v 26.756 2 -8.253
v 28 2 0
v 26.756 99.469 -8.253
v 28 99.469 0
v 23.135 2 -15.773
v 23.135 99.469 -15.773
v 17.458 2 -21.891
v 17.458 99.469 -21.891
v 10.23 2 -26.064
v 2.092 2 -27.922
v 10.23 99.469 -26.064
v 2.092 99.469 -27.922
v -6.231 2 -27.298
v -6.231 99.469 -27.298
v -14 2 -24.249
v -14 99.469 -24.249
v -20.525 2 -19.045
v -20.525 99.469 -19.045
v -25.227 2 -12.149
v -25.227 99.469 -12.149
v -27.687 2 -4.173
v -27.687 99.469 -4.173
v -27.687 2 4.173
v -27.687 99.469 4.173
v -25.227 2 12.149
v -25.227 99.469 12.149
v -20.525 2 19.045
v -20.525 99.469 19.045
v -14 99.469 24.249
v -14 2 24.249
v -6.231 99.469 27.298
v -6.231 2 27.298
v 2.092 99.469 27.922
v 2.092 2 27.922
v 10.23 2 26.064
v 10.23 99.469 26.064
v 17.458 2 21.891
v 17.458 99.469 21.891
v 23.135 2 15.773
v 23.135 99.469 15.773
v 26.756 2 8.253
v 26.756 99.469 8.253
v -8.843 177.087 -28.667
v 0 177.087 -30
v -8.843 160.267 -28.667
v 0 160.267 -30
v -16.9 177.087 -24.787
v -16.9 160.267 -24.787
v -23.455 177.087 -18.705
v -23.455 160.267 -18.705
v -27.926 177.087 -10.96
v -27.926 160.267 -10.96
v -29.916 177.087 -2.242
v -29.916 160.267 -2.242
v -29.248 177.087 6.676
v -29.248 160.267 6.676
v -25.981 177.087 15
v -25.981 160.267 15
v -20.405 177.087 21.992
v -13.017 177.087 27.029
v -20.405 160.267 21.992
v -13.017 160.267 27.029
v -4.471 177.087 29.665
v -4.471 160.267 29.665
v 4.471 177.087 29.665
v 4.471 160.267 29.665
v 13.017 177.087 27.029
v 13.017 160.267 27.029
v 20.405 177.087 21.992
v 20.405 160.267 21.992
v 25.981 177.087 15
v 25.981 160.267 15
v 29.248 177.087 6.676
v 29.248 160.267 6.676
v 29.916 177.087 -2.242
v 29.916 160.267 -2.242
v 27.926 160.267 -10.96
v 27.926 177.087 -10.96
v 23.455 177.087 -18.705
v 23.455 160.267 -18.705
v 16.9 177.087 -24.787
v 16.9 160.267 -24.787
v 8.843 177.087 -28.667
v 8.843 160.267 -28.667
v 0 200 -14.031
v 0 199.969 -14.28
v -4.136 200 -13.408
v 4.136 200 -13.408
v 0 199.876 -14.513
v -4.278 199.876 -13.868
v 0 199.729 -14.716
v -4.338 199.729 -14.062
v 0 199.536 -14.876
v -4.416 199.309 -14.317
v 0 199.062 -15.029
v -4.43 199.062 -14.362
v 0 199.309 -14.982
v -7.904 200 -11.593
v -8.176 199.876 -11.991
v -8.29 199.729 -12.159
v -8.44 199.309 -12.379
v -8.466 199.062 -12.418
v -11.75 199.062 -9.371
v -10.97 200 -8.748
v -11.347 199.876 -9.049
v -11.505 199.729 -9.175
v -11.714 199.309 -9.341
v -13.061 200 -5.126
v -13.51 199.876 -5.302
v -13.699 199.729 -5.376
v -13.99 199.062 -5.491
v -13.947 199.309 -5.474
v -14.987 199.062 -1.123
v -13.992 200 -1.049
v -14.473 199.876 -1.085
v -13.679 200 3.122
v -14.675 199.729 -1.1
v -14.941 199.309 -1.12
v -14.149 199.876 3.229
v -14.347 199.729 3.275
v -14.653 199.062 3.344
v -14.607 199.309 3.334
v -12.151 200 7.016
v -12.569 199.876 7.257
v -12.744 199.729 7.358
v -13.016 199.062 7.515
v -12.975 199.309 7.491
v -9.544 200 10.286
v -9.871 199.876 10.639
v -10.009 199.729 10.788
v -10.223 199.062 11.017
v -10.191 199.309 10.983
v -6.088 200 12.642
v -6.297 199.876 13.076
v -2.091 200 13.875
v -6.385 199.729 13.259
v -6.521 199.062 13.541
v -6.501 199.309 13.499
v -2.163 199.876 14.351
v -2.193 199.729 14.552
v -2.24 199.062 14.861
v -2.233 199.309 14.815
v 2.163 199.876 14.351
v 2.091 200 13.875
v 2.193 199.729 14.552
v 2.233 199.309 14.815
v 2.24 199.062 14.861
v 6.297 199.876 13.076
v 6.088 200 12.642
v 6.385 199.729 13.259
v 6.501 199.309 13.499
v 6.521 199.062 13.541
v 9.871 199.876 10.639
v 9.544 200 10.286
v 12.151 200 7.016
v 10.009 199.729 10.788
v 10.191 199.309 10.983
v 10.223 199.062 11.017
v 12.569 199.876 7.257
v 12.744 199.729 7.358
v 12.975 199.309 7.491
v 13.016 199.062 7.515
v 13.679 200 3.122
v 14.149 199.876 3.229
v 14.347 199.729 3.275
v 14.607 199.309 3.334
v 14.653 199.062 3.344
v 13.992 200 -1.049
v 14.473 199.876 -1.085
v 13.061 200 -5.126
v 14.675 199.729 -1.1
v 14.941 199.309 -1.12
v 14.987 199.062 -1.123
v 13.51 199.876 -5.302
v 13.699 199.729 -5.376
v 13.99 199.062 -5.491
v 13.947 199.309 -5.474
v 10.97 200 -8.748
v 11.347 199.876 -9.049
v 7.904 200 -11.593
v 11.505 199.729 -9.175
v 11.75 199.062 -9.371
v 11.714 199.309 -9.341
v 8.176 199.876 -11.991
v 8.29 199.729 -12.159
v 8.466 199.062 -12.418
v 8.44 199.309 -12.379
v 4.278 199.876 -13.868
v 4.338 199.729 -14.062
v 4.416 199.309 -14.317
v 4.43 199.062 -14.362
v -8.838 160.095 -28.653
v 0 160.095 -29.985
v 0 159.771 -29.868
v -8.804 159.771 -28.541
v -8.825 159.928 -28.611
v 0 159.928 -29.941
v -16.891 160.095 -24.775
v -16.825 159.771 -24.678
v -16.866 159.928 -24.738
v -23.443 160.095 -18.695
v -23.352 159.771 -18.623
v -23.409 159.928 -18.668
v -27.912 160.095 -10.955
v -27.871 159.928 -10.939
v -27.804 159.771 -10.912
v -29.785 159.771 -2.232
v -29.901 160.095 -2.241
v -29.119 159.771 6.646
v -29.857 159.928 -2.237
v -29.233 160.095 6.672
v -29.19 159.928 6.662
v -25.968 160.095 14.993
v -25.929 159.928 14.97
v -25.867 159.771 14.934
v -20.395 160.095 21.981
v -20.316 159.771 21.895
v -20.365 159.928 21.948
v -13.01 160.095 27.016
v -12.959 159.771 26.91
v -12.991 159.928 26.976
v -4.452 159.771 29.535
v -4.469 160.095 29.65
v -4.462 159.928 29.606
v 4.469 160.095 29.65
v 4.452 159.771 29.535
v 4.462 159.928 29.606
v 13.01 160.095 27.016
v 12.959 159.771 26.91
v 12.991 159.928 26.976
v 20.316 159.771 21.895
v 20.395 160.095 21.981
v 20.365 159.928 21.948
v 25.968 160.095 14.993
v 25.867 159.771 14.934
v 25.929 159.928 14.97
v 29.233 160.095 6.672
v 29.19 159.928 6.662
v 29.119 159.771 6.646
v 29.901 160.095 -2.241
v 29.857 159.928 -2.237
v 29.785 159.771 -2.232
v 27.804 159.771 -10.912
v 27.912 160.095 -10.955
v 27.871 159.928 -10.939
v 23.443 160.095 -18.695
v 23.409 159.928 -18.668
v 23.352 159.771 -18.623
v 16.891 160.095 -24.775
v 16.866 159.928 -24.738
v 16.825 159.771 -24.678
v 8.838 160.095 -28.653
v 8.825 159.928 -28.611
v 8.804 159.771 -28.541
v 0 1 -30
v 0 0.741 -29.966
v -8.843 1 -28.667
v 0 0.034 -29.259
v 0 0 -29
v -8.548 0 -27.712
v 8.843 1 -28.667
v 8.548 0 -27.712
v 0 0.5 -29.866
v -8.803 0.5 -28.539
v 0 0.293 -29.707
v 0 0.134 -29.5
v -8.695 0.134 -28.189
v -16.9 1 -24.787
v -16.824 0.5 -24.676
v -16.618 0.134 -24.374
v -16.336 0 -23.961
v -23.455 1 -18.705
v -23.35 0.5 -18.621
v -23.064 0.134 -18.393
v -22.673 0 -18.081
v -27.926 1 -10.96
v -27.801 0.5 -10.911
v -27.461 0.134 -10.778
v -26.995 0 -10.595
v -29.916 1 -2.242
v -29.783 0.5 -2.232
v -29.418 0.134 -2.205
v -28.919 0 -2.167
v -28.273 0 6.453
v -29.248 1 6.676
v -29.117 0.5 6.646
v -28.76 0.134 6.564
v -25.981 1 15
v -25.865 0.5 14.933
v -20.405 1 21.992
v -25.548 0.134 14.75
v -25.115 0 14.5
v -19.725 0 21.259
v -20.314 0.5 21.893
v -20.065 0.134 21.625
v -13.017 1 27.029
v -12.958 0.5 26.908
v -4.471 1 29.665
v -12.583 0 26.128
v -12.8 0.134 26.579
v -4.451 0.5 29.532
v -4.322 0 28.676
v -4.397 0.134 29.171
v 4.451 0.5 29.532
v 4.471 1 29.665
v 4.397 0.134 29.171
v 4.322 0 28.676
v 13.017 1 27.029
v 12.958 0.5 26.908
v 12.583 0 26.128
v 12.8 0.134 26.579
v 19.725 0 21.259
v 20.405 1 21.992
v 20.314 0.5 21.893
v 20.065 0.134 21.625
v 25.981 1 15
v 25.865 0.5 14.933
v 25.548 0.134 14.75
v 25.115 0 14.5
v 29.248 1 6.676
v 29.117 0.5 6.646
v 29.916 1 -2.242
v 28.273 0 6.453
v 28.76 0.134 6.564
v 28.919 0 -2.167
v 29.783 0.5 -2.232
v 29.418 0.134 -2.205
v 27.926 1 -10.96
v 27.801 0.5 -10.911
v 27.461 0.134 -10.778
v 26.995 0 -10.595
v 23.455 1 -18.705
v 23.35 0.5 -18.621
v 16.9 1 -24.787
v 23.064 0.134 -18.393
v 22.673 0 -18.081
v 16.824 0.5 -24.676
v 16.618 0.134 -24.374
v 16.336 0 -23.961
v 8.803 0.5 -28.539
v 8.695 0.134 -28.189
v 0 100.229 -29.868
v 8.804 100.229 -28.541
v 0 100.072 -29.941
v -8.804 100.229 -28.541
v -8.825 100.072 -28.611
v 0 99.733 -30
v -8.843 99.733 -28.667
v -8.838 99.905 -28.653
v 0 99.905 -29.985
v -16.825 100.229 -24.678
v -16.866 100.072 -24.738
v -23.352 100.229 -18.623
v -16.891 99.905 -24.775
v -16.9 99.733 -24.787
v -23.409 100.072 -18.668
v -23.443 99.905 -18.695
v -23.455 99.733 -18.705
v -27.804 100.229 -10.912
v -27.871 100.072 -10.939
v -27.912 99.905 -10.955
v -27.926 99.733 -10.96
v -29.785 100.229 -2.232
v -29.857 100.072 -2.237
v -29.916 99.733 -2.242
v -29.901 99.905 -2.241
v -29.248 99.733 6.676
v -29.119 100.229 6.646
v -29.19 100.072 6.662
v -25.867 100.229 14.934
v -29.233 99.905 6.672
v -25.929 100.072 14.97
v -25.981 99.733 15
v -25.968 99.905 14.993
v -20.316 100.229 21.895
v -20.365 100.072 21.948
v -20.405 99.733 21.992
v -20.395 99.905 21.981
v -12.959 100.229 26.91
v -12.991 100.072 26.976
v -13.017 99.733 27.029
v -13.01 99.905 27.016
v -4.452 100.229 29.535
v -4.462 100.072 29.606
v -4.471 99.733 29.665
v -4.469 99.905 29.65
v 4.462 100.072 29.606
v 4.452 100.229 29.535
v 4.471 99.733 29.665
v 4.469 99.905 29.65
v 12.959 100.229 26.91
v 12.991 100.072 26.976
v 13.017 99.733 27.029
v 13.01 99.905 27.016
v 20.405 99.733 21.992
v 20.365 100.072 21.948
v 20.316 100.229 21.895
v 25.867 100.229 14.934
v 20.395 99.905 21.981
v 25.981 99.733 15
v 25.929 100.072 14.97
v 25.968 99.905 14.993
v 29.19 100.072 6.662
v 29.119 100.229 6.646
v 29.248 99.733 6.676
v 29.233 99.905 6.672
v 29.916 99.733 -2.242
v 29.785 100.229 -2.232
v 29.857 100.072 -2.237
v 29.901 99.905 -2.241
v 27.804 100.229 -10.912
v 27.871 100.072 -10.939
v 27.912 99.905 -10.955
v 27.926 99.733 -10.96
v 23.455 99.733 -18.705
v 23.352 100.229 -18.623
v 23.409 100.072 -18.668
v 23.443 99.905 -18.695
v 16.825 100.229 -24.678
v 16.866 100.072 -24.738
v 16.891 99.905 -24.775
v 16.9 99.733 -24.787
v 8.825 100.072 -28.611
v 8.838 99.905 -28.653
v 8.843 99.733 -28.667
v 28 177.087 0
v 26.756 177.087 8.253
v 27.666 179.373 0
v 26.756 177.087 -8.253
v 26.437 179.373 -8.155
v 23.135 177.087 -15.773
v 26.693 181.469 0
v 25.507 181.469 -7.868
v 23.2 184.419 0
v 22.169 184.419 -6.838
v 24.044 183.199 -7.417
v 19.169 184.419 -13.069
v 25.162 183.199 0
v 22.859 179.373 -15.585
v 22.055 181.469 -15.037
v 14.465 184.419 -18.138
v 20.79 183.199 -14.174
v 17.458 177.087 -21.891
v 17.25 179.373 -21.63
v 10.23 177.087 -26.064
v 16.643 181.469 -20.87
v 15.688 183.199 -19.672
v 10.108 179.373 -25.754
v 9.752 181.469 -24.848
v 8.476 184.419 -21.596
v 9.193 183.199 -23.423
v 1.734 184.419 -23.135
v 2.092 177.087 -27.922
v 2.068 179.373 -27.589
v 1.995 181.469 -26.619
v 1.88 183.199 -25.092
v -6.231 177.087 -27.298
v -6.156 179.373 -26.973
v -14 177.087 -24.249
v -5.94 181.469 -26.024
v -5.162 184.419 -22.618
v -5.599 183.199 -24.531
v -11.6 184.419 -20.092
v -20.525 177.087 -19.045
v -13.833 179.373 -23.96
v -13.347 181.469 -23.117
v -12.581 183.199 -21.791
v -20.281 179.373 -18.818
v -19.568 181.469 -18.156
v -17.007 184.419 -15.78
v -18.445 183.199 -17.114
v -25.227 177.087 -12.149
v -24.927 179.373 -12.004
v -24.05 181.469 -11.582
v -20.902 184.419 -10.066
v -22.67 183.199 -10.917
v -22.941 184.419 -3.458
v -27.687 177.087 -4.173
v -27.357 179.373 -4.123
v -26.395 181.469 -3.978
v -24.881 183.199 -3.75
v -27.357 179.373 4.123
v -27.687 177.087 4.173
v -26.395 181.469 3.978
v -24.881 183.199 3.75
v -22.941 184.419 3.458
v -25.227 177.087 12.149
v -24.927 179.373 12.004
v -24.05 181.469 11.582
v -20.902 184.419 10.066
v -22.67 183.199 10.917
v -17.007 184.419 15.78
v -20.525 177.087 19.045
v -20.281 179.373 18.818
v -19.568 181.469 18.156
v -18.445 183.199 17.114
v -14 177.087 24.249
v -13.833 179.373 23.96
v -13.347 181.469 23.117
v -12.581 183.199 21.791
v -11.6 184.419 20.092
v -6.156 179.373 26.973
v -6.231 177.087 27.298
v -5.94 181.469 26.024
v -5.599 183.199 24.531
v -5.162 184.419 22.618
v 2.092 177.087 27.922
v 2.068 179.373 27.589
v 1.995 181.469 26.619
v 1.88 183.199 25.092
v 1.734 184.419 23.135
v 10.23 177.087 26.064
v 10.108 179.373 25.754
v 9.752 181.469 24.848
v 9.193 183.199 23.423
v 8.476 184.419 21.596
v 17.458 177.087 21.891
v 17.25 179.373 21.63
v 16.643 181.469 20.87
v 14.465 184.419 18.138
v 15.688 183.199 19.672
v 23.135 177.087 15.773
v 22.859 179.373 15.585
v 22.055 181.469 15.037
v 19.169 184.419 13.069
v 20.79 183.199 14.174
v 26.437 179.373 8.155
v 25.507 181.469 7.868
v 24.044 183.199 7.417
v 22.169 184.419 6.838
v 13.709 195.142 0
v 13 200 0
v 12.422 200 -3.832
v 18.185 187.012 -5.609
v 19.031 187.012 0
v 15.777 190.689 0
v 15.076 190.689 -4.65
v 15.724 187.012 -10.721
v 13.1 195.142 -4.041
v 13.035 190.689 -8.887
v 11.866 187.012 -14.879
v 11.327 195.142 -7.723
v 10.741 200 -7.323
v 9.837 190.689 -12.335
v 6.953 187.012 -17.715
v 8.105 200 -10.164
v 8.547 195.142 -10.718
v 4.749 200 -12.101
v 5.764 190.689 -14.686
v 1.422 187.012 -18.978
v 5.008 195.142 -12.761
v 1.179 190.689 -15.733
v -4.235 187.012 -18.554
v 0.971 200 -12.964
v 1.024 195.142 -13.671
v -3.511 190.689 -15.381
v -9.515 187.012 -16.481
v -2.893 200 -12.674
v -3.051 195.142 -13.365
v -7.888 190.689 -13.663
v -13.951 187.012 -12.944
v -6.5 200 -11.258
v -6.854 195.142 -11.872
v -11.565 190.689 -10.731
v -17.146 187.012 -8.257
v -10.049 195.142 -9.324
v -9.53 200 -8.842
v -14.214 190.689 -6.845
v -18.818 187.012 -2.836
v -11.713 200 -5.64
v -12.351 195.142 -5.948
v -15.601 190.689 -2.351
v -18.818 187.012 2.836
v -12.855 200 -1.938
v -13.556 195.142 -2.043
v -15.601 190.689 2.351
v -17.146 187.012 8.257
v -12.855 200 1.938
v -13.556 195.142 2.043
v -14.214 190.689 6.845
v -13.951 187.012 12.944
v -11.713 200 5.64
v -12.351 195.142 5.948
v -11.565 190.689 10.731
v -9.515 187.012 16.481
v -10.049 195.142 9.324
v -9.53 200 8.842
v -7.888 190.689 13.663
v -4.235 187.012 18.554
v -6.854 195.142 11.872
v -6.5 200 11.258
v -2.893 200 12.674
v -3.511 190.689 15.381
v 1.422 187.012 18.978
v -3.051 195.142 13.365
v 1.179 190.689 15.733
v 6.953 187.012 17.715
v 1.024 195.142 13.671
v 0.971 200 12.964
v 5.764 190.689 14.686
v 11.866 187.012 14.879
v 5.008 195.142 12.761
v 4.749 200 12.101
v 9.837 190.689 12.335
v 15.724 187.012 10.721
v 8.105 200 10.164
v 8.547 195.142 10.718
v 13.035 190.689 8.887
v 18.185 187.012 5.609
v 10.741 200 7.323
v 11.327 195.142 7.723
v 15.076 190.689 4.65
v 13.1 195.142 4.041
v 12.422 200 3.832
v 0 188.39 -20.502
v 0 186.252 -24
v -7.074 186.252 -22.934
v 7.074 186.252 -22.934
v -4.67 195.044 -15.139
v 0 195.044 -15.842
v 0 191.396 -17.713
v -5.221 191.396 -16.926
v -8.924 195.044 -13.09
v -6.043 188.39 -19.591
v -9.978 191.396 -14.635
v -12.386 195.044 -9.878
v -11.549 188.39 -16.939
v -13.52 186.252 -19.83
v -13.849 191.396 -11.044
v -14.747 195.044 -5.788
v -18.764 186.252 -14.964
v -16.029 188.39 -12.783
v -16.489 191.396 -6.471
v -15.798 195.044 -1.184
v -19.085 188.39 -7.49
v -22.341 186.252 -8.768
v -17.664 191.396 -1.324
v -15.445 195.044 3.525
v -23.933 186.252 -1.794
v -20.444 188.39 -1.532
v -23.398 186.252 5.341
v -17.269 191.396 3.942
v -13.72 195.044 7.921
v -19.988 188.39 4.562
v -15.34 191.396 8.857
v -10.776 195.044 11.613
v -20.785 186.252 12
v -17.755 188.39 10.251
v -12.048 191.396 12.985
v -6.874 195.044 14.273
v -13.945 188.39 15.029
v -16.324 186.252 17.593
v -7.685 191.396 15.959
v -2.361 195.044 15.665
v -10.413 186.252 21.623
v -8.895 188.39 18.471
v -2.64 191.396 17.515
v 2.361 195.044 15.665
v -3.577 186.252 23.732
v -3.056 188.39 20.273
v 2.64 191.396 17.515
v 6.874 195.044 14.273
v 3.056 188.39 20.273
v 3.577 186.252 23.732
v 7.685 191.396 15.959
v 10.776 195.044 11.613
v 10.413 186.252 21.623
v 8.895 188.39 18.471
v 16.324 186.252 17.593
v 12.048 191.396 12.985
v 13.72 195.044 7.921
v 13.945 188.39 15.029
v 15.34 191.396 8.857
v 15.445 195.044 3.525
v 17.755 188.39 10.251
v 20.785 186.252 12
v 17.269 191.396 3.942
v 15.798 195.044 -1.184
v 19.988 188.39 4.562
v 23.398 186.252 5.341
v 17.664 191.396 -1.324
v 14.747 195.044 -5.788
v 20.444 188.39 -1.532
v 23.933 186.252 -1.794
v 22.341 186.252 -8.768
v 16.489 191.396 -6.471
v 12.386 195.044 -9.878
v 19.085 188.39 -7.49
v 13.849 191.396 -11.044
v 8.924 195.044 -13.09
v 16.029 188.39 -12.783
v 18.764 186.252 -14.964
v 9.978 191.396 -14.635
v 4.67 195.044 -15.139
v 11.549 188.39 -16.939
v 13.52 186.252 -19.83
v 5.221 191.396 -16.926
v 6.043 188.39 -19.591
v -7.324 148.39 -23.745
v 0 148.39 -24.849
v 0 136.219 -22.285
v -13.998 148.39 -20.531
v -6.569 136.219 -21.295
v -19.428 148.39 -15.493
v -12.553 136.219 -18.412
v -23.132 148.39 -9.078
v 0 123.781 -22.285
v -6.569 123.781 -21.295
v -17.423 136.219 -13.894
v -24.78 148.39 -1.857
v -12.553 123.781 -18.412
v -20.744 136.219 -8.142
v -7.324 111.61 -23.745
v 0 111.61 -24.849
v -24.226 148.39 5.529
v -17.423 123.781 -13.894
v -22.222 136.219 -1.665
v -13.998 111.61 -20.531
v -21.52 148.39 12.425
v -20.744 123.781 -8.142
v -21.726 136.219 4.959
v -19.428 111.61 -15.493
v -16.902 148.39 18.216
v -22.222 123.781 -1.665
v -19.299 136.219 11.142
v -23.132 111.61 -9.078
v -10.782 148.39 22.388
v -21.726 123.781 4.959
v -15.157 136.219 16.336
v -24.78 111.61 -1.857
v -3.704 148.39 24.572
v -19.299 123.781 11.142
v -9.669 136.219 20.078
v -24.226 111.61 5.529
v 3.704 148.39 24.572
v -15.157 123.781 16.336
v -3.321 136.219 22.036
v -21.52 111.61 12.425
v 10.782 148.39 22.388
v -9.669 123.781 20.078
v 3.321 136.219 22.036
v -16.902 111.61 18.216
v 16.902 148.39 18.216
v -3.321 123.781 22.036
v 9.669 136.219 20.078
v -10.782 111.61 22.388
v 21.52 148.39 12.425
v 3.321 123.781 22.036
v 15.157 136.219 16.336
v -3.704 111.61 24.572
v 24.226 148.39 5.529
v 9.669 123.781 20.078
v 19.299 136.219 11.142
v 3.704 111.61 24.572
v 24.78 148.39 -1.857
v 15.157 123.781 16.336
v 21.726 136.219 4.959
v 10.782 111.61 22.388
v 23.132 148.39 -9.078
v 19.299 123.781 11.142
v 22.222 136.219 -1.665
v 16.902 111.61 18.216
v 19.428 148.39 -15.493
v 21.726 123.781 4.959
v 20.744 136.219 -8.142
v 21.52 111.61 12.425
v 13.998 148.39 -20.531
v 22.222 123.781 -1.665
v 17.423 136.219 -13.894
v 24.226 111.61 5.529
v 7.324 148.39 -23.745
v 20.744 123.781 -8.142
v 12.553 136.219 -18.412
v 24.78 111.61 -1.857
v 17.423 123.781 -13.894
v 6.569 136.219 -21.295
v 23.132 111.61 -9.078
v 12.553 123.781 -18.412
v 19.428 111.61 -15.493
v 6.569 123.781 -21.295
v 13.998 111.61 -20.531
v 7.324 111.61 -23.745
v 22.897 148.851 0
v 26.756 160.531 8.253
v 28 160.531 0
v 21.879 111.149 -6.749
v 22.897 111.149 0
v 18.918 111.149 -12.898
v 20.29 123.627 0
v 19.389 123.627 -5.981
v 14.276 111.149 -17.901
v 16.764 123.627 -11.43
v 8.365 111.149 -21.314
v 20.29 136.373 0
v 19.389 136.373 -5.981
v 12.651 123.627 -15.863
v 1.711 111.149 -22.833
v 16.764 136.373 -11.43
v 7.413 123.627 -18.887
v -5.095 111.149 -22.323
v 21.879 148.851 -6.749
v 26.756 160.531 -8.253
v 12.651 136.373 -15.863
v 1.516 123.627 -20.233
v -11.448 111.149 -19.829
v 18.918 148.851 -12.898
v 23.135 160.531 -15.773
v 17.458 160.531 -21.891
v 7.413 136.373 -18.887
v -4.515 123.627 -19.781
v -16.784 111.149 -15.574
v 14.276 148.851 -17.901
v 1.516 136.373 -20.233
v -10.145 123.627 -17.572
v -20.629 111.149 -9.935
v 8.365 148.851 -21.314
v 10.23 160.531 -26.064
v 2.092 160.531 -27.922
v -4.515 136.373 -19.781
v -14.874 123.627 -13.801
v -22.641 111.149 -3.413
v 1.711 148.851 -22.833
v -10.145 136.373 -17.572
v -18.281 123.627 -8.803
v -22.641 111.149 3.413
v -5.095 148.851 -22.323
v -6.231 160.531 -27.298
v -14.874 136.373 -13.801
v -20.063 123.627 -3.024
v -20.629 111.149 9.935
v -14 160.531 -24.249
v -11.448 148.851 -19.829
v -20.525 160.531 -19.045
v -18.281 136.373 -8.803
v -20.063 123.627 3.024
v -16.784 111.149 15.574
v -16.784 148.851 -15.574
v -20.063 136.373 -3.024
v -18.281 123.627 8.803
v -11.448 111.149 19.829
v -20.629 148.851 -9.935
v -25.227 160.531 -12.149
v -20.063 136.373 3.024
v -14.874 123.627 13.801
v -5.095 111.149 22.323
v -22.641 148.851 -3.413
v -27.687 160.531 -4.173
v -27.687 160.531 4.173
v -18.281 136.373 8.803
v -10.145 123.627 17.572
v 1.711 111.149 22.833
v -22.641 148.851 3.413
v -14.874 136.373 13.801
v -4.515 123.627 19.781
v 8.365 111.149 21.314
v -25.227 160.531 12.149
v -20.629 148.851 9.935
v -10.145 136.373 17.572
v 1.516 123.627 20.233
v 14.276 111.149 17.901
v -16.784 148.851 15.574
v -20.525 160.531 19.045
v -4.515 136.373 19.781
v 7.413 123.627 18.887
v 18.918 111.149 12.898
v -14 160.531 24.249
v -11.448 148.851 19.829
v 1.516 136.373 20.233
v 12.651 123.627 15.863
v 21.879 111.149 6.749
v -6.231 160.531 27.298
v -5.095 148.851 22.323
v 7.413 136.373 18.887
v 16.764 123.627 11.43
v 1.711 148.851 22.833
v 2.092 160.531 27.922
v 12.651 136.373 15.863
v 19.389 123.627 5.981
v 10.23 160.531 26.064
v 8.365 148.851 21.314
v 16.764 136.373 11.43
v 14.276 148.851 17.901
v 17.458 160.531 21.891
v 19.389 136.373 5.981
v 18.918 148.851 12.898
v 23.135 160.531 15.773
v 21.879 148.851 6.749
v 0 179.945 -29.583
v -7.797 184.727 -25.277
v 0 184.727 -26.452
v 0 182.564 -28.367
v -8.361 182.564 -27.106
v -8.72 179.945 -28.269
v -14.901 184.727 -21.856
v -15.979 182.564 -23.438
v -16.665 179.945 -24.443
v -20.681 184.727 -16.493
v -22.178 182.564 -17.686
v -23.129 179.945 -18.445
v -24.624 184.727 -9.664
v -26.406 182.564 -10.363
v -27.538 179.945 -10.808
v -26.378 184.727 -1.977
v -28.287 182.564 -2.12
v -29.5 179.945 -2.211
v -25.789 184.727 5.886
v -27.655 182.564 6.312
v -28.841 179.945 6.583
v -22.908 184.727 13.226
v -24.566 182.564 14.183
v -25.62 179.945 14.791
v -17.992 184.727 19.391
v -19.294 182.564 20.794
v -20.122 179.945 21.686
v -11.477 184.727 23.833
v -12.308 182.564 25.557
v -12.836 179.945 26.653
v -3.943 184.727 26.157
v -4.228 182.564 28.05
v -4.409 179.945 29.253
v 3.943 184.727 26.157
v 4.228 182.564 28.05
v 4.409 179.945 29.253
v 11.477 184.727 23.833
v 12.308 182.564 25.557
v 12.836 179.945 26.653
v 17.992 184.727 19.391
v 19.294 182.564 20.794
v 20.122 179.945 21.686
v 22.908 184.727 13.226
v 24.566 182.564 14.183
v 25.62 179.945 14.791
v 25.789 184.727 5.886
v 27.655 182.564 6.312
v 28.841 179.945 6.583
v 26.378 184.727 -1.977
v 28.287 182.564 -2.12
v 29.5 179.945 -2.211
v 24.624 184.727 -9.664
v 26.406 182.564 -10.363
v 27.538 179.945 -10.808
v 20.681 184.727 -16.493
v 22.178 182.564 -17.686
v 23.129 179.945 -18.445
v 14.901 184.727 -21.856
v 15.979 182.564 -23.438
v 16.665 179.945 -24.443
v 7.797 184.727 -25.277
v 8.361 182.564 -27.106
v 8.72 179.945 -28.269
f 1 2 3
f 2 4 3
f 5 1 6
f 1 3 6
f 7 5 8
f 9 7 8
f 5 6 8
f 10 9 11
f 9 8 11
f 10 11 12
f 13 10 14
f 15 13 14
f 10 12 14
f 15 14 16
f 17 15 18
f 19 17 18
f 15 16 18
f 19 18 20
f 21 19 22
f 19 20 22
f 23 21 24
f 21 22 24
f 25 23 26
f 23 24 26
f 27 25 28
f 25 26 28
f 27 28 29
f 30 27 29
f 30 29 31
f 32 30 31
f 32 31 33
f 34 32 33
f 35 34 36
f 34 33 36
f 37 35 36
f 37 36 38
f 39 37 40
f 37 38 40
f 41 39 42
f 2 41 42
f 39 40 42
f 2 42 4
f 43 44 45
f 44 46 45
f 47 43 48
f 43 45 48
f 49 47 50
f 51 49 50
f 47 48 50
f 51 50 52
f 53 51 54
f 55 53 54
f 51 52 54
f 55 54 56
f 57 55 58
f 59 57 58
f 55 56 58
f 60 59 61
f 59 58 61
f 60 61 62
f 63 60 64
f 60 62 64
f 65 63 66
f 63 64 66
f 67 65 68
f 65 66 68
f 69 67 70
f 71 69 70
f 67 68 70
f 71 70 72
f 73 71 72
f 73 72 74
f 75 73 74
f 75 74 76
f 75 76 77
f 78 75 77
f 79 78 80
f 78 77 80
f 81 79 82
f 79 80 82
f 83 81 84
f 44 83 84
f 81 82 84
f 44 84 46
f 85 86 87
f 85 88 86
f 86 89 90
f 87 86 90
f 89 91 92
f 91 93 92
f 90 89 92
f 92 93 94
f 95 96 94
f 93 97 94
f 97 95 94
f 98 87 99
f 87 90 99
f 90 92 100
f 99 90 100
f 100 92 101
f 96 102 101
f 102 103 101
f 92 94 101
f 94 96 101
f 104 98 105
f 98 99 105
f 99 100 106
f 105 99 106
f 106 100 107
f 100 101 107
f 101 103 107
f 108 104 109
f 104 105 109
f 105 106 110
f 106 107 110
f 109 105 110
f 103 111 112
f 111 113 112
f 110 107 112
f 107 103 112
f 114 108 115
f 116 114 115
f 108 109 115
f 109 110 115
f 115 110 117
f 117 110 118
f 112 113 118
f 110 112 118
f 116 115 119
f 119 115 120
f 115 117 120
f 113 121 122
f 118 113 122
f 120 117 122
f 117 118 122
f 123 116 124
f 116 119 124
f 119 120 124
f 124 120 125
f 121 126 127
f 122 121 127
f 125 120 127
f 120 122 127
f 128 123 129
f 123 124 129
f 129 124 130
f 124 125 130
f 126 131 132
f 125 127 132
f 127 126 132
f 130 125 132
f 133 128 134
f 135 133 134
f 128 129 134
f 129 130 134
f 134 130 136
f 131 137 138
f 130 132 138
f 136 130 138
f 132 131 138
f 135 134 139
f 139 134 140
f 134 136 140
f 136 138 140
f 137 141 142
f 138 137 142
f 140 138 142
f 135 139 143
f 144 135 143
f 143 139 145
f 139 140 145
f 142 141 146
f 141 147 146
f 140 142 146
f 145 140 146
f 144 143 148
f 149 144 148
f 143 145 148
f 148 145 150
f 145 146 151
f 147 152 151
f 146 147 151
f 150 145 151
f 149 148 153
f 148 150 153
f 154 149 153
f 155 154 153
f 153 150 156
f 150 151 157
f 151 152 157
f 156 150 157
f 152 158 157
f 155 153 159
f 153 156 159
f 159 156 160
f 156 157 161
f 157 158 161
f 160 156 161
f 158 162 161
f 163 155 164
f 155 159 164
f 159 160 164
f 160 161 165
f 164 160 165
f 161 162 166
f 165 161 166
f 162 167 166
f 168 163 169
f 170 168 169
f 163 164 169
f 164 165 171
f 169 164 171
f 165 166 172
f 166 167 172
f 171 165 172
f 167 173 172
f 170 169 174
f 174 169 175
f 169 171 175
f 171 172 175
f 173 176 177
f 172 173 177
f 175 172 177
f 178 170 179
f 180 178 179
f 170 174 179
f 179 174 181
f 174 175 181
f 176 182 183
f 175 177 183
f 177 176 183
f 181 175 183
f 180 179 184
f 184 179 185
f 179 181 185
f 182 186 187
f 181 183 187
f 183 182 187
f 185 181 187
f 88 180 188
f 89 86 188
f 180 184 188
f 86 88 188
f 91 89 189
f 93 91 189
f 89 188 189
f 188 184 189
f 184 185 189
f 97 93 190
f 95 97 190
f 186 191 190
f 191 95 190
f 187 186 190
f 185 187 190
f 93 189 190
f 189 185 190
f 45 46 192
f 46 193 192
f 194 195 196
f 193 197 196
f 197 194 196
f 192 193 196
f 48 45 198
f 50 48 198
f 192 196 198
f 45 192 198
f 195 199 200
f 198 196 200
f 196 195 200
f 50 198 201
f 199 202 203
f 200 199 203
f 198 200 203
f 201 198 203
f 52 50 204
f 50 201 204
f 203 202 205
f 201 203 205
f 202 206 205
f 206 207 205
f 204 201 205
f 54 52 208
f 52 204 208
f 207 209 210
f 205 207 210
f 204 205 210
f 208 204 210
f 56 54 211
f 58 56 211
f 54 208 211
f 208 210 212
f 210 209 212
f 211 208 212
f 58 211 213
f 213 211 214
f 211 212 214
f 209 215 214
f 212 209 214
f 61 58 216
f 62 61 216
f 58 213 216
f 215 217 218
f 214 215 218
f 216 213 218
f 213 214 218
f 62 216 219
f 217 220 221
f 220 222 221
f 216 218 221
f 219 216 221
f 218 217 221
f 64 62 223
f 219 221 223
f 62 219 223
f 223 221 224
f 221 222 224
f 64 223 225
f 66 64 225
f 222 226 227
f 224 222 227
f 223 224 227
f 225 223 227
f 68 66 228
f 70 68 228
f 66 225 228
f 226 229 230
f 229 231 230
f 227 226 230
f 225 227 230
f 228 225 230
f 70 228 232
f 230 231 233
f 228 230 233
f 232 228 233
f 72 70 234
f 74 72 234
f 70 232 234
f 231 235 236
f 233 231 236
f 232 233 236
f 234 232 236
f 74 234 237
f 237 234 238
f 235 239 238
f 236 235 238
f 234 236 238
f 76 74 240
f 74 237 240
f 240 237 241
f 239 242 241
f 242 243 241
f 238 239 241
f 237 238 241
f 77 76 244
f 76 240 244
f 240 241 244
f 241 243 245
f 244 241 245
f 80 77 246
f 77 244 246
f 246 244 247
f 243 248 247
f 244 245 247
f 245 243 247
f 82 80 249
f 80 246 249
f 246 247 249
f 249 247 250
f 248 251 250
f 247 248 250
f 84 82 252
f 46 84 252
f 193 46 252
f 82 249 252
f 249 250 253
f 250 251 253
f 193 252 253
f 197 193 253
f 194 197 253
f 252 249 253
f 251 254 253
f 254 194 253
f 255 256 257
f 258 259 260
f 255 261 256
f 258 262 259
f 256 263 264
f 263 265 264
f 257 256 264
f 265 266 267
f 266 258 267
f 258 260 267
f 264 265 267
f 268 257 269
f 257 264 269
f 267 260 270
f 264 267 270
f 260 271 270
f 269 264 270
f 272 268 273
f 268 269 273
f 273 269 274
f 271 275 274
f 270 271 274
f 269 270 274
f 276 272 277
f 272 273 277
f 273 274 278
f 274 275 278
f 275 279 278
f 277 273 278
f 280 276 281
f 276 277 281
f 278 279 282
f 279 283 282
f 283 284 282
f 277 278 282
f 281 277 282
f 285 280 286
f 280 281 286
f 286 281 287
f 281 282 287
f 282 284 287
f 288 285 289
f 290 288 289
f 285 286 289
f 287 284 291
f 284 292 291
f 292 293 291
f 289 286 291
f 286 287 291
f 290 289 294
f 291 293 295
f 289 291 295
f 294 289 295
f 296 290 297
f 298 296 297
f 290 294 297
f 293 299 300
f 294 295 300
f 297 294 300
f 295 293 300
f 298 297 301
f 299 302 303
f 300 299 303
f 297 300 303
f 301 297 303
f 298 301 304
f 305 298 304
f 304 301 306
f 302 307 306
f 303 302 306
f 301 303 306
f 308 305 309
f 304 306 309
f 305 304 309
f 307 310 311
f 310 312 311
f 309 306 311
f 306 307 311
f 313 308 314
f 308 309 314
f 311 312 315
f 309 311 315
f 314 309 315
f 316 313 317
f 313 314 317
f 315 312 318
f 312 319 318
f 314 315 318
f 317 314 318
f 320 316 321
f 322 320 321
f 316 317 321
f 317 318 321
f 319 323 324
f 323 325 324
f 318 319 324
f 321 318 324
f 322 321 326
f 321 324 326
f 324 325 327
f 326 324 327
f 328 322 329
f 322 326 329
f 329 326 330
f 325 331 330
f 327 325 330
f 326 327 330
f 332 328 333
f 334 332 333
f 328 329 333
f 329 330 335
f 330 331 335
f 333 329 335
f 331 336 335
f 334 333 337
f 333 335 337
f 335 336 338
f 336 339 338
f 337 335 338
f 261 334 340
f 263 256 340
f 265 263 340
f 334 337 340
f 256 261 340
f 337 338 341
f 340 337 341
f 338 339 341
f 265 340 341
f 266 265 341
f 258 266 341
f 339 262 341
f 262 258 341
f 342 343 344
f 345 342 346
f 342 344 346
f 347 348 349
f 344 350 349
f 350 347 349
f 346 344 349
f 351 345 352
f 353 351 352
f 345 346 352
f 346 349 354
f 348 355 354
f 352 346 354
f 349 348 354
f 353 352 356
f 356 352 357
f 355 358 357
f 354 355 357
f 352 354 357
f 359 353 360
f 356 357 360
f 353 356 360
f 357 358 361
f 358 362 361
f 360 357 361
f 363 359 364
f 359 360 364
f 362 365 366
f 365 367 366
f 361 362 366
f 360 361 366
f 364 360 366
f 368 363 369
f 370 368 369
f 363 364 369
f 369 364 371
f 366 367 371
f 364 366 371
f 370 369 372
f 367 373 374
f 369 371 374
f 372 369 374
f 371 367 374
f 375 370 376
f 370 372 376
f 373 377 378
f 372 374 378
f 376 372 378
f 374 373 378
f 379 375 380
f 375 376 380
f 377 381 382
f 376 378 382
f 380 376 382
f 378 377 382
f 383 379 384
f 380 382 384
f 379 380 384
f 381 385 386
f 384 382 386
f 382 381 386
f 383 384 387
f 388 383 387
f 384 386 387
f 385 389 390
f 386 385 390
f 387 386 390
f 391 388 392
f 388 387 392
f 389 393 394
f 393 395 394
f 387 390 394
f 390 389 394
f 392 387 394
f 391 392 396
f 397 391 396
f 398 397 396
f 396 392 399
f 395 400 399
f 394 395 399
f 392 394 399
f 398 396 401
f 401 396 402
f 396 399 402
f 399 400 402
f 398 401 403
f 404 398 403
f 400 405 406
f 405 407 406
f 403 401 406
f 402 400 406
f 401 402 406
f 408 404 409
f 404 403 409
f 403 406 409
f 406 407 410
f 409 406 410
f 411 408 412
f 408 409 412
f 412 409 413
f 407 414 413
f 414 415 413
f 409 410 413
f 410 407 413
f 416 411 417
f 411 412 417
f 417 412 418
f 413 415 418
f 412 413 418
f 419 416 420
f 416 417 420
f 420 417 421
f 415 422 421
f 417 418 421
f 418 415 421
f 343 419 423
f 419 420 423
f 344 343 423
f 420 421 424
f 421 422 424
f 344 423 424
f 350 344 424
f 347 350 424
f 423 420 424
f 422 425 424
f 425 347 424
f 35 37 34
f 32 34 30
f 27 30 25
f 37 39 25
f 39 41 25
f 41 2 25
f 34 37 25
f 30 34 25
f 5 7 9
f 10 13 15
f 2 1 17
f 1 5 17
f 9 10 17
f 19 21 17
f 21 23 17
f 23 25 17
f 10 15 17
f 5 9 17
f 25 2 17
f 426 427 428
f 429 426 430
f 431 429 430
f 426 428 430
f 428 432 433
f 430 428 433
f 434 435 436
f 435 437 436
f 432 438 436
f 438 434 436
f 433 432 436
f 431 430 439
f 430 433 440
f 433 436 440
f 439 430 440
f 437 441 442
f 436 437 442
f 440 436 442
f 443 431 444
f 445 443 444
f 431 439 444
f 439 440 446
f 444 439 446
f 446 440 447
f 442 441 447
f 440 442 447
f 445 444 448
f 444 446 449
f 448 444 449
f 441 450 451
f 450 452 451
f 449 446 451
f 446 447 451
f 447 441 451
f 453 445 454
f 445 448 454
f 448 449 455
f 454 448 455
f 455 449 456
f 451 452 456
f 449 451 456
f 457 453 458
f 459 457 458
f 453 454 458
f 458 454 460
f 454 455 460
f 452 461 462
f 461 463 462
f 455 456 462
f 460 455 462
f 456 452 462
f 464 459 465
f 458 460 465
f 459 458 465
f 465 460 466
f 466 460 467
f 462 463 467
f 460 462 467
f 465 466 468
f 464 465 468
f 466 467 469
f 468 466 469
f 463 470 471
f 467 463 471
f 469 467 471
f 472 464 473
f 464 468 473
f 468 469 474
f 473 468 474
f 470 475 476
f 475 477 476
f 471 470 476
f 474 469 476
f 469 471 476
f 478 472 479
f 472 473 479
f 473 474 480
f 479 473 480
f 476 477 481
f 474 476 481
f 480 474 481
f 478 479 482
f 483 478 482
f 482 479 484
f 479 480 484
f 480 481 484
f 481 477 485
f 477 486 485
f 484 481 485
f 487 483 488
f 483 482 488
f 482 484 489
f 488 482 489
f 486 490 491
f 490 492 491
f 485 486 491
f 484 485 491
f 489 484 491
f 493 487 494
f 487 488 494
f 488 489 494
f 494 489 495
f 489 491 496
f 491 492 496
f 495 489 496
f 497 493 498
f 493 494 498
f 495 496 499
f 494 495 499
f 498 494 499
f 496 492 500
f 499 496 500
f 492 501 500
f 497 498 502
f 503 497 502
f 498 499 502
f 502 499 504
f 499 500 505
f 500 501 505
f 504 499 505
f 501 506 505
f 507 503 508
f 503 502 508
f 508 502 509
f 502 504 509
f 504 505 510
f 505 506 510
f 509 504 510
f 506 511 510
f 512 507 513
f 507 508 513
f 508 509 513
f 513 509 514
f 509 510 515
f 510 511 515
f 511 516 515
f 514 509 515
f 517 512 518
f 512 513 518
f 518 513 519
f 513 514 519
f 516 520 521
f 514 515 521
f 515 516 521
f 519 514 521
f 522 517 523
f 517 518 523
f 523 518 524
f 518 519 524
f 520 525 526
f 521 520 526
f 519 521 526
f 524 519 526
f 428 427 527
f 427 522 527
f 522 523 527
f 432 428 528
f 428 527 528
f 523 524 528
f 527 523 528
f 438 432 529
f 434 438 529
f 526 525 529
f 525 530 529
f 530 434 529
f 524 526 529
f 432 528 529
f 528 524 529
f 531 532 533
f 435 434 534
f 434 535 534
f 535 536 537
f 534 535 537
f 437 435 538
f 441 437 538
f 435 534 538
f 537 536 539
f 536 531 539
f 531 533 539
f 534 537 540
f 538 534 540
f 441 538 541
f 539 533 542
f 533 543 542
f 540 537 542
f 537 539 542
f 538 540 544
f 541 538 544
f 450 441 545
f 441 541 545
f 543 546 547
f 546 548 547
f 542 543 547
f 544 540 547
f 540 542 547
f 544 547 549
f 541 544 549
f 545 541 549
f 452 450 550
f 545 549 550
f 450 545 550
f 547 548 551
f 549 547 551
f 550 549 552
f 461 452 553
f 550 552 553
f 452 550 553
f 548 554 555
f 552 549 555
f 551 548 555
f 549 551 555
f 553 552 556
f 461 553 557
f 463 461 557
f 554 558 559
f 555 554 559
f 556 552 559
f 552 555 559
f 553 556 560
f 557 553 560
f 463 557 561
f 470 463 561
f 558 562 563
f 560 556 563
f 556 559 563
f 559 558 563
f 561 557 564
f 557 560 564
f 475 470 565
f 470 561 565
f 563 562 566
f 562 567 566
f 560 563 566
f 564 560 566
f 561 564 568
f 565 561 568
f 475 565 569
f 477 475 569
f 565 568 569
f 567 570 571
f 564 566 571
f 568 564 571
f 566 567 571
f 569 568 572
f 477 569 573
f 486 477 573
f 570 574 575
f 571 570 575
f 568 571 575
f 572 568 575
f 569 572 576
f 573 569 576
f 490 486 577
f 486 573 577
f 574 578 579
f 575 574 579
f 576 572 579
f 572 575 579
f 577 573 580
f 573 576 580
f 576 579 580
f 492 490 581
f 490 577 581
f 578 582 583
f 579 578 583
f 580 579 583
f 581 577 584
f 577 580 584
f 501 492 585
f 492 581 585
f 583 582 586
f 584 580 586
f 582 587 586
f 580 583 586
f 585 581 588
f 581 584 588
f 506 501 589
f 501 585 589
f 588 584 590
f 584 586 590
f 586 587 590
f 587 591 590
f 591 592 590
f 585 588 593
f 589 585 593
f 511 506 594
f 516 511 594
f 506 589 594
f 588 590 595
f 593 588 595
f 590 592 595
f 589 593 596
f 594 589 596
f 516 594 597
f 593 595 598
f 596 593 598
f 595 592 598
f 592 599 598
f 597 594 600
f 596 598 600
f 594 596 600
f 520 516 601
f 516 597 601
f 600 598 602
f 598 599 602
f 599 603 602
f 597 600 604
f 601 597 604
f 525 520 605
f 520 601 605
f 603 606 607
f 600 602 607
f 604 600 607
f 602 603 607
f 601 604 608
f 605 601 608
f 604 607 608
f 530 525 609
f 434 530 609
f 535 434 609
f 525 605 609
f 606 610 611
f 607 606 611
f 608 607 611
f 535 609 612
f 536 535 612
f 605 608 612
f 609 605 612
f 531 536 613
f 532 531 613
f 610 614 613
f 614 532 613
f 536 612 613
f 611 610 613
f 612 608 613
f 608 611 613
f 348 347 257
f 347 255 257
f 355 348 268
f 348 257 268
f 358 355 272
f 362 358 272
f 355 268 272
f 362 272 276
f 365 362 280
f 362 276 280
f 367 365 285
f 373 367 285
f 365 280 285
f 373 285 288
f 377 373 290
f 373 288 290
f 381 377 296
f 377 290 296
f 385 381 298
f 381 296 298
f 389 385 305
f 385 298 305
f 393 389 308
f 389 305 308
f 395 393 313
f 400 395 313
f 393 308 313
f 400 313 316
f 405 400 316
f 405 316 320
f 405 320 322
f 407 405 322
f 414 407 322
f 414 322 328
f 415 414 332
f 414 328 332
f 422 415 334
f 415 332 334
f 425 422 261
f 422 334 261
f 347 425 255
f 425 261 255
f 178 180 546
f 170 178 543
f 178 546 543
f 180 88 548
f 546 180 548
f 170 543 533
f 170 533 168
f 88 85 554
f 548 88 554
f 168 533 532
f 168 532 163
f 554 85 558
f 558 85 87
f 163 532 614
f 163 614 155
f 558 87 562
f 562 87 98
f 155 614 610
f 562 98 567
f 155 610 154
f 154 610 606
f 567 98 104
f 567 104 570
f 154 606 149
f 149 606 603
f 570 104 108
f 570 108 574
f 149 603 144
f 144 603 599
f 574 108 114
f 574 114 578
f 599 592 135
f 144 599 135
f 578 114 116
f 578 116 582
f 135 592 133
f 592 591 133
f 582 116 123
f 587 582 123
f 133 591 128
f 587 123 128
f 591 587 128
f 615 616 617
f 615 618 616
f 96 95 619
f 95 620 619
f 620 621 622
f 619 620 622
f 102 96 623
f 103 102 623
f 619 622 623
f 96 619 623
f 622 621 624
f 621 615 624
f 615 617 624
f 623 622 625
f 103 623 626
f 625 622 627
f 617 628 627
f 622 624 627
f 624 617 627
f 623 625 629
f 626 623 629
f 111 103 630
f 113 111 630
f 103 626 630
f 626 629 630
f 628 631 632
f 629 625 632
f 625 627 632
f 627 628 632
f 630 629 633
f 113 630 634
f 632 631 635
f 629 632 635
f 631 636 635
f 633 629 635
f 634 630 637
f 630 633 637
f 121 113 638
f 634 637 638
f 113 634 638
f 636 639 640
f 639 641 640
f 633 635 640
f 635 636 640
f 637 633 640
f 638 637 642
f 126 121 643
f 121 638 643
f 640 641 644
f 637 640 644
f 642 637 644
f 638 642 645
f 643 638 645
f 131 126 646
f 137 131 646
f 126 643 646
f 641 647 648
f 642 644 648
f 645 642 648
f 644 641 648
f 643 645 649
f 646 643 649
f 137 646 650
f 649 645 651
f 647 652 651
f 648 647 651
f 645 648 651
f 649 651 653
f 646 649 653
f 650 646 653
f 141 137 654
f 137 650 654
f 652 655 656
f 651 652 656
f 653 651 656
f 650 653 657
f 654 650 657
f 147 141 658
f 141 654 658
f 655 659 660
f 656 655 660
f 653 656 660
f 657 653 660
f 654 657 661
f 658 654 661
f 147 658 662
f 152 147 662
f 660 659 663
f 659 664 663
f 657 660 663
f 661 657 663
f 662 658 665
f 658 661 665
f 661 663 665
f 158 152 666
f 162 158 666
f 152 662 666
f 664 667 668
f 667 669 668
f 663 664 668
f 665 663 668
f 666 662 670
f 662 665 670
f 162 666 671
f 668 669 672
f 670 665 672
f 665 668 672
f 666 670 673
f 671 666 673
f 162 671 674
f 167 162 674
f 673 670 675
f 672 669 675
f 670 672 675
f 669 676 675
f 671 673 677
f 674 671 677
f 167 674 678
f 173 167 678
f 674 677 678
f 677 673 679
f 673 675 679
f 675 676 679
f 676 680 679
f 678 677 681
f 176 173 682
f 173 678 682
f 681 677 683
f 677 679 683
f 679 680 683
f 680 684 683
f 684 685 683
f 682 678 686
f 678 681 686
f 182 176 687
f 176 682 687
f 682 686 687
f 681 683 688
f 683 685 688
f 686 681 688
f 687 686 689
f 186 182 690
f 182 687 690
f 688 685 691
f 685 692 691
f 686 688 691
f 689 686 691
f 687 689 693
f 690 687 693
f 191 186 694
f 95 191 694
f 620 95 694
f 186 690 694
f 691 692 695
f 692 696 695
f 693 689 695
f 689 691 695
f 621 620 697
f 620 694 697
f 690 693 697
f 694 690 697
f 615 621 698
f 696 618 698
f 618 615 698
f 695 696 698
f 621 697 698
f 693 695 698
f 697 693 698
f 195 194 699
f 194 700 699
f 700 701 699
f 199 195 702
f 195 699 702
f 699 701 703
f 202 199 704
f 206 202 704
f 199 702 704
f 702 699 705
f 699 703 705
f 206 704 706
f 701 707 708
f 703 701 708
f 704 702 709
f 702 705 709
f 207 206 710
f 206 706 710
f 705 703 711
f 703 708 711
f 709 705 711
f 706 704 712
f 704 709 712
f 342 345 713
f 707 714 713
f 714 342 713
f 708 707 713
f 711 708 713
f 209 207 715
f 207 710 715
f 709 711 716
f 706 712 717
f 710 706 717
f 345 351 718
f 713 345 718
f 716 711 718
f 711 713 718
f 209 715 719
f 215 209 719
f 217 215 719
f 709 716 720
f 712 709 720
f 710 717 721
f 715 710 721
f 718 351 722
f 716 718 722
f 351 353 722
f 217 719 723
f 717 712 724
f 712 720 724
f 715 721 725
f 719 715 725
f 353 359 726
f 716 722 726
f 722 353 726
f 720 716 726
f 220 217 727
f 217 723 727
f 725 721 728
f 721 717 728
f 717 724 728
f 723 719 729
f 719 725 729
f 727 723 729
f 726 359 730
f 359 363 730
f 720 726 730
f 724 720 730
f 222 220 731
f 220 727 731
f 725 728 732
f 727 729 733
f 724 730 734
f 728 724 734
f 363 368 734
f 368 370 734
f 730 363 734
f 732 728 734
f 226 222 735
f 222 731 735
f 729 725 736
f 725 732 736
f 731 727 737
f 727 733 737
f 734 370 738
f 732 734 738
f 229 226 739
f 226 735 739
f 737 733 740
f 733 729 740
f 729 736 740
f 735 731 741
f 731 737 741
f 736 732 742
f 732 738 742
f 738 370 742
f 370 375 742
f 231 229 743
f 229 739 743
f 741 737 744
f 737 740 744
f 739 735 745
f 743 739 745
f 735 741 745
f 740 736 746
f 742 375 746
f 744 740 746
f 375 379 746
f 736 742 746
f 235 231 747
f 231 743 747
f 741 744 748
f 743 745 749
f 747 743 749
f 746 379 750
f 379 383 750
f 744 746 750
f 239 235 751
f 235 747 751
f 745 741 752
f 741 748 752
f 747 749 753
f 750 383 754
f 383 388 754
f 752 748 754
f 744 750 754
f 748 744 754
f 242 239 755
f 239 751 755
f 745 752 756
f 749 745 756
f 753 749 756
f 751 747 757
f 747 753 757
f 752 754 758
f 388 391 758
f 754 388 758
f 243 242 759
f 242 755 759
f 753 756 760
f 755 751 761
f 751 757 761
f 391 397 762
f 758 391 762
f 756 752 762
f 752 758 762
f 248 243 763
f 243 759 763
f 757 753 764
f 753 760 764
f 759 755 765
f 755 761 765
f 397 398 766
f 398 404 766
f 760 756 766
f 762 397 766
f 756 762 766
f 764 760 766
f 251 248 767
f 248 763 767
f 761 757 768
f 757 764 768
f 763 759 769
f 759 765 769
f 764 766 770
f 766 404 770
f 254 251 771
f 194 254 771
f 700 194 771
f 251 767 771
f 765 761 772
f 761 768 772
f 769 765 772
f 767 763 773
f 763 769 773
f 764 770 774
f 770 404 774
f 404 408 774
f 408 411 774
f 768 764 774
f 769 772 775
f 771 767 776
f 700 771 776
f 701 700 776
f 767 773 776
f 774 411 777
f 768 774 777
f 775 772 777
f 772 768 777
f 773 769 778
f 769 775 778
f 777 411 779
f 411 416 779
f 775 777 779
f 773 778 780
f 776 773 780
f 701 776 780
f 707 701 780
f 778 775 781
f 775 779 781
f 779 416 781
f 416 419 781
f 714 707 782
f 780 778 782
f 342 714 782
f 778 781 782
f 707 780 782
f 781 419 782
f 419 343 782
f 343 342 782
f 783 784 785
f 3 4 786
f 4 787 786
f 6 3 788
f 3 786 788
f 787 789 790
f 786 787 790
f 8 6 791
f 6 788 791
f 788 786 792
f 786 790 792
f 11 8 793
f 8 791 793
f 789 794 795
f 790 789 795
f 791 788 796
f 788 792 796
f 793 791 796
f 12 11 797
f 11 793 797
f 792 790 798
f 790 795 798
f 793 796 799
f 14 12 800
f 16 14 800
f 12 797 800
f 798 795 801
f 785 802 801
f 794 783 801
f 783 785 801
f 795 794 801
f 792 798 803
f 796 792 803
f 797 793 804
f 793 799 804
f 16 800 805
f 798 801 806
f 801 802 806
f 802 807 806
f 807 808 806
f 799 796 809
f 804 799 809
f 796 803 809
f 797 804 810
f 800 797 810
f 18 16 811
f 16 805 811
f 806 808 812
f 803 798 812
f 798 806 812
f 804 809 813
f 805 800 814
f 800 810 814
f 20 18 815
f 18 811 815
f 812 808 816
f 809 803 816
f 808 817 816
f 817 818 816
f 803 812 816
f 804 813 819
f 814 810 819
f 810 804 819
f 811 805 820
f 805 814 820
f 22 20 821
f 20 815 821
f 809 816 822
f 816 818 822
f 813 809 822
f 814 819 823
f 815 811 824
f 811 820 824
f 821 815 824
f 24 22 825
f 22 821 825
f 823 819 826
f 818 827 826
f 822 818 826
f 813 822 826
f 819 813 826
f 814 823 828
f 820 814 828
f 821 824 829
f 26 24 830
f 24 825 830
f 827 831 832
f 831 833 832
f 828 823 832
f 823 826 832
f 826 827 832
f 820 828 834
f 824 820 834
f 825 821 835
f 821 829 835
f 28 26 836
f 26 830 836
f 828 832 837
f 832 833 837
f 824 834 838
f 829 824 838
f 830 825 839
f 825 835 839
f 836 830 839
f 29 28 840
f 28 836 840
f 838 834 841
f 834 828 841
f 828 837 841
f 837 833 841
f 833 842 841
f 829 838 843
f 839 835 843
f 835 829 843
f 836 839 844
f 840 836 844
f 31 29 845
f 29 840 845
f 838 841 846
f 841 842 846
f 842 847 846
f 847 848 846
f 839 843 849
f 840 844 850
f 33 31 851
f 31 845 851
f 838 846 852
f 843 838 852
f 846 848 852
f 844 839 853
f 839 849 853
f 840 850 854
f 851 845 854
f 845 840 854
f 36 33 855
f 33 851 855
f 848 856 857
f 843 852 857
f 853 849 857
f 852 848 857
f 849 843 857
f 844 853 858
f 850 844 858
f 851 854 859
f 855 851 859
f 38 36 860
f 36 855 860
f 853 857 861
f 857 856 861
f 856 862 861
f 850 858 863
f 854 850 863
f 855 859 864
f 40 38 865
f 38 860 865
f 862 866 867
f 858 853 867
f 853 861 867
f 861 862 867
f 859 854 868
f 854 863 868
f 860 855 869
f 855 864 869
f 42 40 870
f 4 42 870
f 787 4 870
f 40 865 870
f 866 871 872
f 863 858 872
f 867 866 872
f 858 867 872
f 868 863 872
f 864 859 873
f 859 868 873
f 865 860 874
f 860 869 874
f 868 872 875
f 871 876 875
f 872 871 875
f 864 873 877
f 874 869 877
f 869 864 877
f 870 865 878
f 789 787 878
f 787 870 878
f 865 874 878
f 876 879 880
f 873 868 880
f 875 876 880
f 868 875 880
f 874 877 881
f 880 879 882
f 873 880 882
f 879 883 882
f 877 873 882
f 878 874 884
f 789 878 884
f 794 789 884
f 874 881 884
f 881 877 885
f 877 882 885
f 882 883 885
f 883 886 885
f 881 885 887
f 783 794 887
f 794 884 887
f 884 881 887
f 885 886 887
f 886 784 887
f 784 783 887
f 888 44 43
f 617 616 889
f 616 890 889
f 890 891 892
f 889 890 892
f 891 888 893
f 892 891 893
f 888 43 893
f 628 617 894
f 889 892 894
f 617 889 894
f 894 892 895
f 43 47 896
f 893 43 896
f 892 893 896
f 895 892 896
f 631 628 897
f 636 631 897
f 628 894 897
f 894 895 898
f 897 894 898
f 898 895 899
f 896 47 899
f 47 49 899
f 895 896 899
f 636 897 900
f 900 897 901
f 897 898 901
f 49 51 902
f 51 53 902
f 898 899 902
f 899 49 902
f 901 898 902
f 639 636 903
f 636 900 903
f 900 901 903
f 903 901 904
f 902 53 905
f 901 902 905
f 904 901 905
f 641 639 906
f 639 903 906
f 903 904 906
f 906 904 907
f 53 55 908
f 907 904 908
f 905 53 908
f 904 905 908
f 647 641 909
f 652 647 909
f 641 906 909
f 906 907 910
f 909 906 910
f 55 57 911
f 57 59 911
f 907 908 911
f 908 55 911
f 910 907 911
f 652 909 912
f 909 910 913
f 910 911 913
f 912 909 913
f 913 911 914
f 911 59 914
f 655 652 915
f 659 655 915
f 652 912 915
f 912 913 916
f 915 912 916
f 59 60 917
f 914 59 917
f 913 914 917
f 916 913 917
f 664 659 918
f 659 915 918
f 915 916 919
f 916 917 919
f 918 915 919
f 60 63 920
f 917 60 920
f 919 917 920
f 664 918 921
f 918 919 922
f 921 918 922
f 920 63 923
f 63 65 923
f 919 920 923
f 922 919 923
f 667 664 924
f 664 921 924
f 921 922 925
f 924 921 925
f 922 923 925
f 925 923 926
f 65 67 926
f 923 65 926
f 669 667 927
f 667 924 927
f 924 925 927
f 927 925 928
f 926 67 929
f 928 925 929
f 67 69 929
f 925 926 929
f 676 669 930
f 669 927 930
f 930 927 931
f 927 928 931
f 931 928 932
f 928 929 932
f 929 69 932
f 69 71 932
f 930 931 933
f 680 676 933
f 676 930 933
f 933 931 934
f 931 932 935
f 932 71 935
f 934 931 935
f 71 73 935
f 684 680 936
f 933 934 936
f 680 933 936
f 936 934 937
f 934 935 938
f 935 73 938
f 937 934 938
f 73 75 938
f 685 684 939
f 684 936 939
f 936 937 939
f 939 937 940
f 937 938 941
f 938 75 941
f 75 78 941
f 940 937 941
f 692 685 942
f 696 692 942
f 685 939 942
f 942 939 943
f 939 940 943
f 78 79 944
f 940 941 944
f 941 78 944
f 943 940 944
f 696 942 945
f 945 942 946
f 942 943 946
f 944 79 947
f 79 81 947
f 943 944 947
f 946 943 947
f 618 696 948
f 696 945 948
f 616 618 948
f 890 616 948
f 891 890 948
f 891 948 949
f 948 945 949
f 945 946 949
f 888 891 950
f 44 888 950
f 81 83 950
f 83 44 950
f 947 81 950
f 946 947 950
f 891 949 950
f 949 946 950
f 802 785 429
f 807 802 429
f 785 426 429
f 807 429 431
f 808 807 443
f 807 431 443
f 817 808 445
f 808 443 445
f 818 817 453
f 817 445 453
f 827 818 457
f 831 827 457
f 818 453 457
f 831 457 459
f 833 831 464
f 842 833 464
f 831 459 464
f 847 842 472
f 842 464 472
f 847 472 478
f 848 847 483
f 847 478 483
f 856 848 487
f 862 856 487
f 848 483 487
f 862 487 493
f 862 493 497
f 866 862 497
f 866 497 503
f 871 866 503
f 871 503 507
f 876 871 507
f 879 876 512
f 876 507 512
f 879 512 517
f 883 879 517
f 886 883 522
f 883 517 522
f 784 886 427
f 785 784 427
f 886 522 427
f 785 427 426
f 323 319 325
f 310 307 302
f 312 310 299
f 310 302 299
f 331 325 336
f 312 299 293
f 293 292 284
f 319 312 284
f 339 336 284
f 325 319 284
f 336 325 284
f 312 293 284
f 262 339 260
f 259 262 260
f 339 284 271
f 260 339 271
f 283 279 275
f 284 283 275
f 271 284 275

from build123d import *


# Read off the part's stored shape, not the designer's step: Shell1
with BuildPart() as part:
    # Sketch1 → Revolve1 (revolve)
    with BuildSketch(Plane(origin=(0, 0, 0), x_dir=(0, 0, -1), z_dir=(1, 0, 0))):
        with BuildLine():
            Line((0, 0), (0, 200))
            Line((0, 200), (14.031280577, 200))
            ThreePointArc((14.031280577, 200), (14.715933774, 199.728868987), (15.029325541, 199.0625))
            ThreePointArc((15.029325541, 199.0625), (17.713105506, 191.395801973), (24, 186.252272915))
            ThreePointArc((24, 186.252272915), (28.366600265, 182.5643471), (30, 177.087121525))
            Line((30, 177.087121525), (30, 160.266763149))
            ThreePointArc((30, 160.266763149), (29.966494105, 160.010074338), (29.868221709, 159.770586704))
            ThreePointArc((29.868221709, 159.770586704), (21.961524227, 130), (29.868221709, 100.229413296))
            ThreePointArc((29.868221709, 100.229413296), (29.966494105, 99.989925662), (30, 99.733236851))
            Line((30, 99.733236851), (30, 1))
            ThreePointArc((30, 1), (29.707106781, 0.292893219), (29, 0))
            Line((29, 0), (0, 0))
        make_face()
    revolve(axis=Axis((0, 0, 0), (0, 1, 0)))

    # Shell1 outline → Shell1 (revolve, cut)
    with BuildSketch(Plane.XY):
        with BuildLine():
            Line((28, 2), (28, 99.468804427))
            ThreePointArc((28, 99.468804427), (19.961524227, 130), (28, 160.531195573))
            Line((28, 160.531195573), (28, 177.087121525))
            ThreePointArc((28, 177.087121525), (26.693280212, 181.468901985), (23.2, 184.419242637))
            ThreePointArc((23.2, 184.419242637), (15.776779549, 190.688716522), (13, 200))
            Line((13, 200), (0, 200))
            Line((0, 200), (0, 2))
            Line((0, 2), (28, 2))
        make_face()
    revolve(axis=Axis((0, 0, 0), (0, 1, 0)), mode=Mode.SUBTRACT)


solid = part.part
